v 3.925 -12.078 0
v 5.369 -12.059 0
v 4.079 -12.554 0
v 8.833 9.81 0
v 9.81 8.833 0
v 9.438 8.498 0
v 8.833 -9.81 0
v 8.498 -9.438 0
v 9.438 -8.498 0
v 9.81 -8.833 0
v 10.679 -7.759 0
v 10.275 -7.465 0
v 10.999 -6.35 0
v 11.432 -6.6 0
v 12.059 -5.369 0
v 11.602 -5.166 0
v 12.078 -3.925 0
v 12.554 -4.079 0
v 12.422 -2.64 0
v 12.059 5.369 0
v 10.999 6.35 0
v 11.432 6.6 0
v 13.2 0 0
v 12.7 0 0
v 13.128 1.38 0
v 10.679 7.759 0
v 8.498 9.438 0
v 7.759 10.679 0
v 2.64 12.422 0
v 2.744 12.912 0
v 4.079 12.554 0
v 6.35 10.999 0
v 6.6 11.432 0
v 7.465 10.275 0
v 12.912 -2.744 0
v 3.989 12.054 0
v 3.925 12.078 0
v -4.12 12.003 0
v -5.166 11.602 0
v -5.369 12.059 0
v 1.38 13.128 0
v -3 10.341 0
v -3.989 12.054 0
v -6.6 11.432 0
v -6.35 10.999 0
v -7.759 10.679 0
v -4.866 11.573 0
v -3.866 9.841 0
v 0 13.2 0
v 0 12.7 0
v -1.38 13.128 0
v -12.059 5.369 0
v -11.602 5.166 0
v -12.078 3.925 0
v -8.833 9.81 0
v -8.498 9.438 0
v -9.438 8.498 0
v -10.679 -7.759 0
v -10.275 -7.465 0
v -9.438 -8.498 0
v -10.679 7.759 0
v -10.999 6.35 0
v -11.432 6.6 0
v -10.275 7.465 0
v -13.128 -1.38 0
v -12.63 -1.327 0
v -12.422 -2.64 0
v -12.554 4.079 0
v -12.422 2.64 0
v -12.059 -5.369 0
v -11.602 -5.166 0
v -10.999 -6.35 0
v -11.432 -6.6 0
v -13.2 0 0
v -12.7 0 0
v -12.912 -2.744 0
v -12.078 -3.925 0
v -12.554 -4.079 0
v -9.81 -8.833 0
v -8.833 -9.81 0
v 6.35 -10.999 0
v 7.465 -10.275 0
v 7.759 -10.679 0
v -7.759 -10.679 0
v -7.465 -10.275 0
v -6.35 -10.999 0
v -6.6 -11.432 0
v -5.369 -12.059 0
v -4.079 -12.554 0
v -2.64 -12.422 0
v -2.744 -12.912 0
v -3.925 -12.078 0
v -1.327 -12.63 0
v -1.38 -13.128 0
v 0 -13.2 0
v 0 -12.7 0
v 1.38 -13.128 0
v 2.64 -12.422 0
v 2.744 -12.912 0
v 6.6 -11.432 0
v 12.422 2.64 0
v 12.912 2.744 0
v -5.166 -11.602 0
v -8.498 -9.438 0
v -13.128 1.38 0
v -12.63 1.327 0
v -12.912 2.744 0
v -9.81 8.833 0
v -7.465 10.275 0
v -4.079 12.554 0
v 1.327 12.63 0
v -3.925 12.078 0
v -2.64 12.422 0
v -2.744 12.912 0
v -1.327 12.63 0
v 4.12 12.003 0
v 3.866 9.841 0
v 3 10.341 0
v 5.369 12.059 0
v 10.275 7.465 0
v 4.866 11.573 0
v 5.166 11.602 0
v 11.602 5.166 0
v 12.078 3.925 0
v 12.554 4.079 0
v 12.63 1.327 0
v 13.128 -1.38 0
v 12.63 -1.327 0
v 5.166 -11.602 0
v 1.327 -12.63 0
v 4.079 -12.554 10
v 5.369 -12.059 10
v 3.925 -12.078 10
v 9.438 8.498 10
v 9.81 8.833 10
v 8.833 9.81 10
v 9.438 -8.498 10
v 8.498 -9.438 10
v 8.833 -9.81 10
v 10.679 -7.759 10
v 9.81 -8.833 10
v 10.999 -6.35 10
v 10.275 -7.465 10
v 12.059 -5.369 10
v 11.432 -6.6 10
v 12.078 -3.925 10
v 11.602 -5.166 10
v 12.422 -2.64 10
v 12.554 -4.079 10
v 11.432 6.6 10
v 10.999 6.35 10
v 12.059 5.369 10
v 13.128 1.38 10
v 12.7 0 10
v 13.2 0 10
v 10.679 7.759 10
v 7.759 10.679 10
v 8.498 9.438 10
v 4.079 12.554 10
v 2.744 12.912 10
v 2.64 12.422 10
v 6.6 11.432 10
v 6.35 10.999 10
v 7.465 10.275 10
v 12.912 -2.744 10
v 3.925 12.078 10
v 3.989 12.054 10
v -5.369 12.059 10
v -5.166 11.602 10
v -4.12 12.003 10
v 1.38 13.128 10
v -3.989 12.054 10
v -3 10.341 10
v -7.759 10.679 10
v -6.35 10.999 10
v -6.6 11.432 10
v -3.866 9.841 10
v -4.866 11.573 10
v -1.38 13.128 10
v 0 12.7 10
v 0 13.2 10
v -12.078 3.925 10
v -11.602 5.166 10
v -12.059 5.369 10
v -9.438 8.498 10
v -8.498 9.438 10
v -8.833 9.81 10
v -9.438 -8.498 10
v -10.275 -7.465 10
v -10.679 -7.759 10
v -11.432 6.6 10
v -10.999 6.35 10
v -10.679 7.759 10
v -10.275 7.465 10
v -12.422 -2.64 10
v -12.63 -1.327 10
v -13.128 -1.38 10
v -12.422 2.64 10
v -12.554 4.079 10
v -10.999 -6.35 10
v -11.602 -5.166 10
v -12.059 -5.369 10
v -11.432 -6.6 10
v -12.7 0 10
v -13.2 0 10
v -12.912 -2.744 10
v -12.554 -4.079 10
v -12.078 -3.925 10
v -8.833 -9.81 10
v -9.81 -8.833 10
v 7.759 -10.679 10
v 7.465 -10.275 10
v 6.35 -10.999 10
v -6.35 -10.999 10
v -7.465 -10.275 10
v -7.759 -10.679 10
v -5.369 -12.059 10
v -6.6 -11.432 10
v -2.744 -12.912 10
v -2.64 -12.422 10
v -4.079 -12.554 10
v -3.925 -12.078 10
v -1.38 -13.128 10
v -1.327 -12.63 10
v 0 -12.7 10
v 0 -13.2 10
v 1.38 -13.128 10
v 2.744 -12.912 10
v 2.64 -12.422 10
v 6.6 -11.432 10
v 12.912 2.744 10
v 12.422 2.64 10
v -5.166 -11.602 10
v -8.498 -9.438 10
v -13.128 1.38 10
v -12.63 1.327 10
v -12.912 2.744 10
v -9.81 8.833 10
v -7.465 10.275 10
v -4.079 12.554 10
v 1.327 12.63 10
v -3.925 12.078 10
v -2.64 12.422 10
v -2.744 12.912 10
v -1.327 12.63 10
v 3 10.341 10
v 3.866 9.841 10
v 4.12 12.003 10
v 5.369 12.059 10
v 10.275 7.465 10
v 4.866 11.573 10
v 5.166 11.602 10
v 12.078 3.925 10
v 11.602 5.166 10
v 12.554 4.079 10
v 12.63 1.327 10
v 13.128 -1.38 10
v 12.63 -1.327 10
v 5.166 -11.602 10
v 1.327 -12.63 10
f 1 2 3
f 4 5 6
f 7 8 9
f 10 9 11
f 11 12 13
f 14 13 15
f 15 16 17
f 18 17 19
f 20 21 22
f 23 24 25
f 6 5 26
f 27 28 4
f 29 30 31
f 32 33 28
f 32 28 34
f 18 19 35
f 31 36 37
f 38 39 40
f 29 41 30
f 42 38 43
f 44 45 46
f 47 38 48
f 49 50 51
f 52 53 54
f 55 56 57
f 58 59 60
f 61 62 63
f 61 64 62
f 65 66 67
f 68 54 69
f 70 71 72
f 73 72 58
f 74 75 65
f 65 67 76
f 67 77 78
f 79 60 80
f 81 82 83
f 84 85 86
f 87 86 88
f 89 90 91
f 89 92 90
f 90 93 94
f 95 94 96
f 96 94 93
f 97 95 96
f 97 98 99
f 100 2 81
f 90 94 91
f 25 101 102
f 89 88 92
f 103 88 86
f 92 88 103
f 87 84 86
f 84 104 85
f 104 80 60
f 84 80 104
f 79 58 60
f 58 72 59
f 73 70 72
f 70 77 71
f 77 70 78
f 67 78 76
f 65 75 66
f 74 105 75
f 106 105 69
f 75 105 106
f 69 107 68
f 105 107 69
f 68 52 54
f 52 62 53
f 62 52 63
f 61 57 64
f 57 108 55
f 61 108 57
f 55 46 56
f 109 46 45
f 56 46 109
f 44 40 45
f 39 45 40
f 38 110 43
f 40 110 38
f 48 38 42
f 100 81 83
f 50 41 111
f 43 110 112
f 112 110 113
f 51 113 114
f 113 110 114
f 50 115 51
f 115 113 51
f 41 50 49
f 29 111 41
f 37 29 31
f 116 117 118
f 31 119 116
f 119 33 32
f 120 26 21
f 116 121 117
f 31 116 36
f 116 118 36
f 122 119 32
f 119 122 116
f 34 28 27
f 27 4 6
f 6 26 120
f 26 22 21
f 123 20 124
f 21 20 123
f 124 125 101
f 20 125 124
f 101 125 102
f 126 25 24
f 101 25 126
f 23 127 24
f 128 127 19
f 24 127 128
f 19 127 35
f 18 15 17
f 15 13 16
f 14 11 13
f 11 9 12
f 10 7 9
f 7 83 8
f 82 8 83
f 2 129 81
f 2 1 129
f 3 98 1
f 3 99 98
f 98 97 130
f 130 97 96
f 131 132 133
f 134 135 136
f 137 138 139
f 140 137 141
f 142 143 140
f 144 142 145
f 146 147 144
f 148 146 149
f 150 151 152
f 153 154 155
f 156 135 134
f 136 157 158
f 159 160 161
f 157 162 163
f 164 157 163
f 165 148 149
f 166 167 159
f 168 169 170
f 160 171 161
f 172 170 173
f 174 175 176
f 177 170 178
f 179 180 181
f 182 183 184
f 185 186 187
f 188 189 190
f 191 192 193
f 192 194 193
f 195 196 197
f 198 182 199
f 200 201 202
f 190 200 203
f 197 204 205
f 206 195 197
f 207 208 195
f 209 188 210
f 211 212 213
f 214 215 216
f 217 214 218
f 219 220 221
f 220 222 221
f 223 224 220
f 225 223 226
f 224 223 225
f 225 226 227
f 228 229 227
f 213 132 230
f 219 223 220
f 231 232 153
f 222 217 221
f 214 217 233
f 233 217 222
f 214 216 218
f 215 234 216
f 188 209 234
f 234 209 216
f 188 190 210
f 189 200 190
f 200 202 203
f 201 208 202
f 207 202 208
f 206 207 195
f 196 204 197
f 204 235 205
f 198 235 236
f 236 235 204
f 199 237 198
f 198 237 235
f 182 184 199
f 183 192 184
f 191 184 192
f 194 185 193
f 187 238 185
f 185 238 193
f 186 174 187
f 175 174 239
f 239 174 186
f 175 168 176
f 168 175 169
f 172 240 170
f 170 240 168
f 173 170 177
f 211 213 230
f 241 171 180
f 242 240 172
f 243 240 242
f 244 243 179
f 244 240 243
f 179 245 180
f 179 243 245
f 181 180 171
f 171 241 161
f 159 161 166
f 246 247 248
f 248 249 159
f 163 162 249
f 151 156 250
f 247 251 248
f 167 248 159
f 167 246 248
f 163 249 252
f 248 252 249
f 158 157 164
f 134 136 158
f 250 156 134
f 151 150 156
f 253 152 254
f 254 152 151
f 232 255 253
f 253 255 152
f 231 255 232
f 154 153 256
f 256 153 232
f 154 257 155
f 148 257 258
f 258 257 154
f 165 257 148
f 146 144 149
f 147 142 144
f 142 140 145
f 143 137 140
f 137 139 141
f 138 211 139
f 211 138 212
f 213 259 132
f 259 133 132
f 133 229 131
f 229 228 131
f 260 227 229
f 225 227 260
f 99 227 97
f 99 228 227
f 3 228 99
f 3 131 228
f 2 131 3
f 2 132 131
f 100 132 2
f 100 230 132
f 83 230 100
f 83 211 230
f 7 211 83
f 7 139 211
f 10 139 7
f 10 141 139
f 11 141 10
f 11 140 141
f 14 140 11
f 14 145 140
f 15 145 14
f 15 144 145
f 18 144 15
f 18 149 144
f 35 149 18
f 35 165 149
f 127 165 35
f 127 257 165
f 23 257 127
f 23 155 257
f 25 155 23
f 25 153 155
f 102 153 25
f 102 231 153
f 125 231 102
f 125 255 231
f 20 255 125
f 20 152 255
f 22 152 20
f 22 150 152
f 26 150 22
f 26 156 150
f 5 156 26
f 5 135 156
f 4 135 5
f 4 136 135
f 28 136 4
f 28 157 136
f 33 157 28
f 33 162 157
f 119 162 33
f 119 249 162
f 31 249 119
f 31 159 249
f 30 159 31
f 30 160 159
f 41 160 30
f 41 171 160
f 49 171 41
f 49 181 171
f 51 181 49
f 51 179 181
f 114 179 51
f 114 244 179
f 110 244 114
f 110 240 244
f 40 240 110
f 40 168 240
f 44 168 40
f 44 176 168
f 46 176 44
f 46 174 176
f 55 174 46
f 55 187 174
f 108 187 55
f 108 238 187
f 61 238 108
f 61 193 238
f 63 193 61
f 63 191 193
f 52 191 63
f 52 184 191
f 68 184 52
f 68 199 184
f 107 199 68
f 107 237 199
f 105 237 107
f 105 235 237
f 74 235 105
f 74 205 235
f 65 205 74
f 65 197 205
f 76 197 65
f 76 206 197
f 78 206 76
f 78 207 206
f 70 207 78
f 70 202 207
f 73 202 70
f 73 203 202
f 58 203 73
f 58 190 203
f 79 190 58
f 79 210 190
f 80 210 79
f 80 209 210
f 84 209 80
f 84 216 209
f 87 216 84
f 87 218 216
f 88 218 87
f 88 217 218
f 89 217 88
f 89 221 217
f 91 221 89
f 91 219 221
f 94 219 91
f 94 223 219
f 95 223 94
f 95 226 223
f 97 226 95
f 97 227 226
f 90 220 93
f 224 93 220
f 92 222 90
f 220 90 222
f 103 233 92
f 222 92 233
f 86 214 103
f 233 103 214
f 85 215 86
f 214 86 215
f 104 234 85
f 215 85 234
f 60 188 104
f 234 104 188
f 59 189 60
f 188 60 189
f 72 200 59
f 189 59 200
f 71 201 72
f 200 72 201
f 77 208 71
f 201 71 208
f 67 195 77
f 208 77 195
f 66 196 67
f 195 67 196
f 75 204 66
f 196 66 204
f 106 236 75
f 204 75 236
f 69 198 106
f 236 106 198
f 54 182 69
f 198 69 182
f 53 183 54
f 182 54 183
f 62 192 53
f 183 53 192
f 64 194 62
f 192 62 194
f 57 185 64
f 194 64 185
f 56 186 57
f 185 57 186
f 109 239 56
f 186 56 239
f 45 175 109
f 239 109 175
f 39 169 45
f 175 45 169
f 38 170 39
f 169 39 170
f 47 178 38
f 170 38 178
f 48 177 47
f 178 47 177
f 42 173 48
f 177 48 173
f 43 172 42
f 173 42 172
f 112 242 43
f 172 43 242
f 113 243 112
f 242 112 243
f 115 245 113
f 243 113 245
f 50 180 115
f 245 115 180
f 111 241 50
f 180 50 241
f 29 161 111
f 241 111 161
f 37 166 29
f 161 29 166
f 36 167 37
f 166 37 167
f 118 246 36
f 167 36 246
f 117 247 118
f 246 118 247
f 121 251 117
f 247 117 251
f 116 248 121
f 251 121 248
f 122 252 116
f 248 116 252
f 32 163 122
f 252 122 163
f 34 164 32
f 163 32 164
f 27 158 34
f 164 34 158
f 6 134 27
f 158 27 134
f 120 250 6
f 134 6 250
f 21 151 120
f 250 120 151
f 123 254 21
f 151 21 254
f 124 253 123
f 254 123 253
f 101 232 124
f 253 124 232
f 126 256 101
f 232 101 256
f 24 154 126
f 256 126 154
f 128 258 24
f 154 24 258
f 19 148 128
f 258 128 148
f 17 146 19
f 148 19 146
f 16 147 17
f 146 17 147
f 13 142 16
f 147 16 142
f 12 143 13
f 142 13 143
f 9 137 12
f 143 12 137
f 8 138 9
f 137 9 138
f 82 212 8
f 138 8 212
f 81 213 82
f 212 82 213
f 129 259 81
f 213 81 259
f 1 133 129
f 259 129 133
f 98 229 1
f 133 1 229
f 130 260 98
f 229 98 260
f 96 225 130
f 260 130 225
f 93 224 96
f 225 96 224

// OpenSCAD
$fn = 60;

module blind(length = 10) {
    // Inner radius
    r = 12.7;

    module tube() {
        difference() {
            circle(r = r + 0.5);
            circle(r = r);
        }
    }

    module fins () {
        inner_gap = 6;
        outer_gap = 8;
        h = 2;
        w = 1;

        angle = acos(((outer_gap - inner_gap) / 2) / 2);

        g = inner_gap / 2;
        offset = sqrt(r*r - g*g) - h;

        for (i = [0, 1]) {
            mirror([i, 0, 0])
            translate([g, offset])
            rotate([0, 0, -(90 - angle)])
            square([w, h]);
        }
    }

    linear_extrude(height = length) {
        fins();
        tube();
    }
}

blind();
